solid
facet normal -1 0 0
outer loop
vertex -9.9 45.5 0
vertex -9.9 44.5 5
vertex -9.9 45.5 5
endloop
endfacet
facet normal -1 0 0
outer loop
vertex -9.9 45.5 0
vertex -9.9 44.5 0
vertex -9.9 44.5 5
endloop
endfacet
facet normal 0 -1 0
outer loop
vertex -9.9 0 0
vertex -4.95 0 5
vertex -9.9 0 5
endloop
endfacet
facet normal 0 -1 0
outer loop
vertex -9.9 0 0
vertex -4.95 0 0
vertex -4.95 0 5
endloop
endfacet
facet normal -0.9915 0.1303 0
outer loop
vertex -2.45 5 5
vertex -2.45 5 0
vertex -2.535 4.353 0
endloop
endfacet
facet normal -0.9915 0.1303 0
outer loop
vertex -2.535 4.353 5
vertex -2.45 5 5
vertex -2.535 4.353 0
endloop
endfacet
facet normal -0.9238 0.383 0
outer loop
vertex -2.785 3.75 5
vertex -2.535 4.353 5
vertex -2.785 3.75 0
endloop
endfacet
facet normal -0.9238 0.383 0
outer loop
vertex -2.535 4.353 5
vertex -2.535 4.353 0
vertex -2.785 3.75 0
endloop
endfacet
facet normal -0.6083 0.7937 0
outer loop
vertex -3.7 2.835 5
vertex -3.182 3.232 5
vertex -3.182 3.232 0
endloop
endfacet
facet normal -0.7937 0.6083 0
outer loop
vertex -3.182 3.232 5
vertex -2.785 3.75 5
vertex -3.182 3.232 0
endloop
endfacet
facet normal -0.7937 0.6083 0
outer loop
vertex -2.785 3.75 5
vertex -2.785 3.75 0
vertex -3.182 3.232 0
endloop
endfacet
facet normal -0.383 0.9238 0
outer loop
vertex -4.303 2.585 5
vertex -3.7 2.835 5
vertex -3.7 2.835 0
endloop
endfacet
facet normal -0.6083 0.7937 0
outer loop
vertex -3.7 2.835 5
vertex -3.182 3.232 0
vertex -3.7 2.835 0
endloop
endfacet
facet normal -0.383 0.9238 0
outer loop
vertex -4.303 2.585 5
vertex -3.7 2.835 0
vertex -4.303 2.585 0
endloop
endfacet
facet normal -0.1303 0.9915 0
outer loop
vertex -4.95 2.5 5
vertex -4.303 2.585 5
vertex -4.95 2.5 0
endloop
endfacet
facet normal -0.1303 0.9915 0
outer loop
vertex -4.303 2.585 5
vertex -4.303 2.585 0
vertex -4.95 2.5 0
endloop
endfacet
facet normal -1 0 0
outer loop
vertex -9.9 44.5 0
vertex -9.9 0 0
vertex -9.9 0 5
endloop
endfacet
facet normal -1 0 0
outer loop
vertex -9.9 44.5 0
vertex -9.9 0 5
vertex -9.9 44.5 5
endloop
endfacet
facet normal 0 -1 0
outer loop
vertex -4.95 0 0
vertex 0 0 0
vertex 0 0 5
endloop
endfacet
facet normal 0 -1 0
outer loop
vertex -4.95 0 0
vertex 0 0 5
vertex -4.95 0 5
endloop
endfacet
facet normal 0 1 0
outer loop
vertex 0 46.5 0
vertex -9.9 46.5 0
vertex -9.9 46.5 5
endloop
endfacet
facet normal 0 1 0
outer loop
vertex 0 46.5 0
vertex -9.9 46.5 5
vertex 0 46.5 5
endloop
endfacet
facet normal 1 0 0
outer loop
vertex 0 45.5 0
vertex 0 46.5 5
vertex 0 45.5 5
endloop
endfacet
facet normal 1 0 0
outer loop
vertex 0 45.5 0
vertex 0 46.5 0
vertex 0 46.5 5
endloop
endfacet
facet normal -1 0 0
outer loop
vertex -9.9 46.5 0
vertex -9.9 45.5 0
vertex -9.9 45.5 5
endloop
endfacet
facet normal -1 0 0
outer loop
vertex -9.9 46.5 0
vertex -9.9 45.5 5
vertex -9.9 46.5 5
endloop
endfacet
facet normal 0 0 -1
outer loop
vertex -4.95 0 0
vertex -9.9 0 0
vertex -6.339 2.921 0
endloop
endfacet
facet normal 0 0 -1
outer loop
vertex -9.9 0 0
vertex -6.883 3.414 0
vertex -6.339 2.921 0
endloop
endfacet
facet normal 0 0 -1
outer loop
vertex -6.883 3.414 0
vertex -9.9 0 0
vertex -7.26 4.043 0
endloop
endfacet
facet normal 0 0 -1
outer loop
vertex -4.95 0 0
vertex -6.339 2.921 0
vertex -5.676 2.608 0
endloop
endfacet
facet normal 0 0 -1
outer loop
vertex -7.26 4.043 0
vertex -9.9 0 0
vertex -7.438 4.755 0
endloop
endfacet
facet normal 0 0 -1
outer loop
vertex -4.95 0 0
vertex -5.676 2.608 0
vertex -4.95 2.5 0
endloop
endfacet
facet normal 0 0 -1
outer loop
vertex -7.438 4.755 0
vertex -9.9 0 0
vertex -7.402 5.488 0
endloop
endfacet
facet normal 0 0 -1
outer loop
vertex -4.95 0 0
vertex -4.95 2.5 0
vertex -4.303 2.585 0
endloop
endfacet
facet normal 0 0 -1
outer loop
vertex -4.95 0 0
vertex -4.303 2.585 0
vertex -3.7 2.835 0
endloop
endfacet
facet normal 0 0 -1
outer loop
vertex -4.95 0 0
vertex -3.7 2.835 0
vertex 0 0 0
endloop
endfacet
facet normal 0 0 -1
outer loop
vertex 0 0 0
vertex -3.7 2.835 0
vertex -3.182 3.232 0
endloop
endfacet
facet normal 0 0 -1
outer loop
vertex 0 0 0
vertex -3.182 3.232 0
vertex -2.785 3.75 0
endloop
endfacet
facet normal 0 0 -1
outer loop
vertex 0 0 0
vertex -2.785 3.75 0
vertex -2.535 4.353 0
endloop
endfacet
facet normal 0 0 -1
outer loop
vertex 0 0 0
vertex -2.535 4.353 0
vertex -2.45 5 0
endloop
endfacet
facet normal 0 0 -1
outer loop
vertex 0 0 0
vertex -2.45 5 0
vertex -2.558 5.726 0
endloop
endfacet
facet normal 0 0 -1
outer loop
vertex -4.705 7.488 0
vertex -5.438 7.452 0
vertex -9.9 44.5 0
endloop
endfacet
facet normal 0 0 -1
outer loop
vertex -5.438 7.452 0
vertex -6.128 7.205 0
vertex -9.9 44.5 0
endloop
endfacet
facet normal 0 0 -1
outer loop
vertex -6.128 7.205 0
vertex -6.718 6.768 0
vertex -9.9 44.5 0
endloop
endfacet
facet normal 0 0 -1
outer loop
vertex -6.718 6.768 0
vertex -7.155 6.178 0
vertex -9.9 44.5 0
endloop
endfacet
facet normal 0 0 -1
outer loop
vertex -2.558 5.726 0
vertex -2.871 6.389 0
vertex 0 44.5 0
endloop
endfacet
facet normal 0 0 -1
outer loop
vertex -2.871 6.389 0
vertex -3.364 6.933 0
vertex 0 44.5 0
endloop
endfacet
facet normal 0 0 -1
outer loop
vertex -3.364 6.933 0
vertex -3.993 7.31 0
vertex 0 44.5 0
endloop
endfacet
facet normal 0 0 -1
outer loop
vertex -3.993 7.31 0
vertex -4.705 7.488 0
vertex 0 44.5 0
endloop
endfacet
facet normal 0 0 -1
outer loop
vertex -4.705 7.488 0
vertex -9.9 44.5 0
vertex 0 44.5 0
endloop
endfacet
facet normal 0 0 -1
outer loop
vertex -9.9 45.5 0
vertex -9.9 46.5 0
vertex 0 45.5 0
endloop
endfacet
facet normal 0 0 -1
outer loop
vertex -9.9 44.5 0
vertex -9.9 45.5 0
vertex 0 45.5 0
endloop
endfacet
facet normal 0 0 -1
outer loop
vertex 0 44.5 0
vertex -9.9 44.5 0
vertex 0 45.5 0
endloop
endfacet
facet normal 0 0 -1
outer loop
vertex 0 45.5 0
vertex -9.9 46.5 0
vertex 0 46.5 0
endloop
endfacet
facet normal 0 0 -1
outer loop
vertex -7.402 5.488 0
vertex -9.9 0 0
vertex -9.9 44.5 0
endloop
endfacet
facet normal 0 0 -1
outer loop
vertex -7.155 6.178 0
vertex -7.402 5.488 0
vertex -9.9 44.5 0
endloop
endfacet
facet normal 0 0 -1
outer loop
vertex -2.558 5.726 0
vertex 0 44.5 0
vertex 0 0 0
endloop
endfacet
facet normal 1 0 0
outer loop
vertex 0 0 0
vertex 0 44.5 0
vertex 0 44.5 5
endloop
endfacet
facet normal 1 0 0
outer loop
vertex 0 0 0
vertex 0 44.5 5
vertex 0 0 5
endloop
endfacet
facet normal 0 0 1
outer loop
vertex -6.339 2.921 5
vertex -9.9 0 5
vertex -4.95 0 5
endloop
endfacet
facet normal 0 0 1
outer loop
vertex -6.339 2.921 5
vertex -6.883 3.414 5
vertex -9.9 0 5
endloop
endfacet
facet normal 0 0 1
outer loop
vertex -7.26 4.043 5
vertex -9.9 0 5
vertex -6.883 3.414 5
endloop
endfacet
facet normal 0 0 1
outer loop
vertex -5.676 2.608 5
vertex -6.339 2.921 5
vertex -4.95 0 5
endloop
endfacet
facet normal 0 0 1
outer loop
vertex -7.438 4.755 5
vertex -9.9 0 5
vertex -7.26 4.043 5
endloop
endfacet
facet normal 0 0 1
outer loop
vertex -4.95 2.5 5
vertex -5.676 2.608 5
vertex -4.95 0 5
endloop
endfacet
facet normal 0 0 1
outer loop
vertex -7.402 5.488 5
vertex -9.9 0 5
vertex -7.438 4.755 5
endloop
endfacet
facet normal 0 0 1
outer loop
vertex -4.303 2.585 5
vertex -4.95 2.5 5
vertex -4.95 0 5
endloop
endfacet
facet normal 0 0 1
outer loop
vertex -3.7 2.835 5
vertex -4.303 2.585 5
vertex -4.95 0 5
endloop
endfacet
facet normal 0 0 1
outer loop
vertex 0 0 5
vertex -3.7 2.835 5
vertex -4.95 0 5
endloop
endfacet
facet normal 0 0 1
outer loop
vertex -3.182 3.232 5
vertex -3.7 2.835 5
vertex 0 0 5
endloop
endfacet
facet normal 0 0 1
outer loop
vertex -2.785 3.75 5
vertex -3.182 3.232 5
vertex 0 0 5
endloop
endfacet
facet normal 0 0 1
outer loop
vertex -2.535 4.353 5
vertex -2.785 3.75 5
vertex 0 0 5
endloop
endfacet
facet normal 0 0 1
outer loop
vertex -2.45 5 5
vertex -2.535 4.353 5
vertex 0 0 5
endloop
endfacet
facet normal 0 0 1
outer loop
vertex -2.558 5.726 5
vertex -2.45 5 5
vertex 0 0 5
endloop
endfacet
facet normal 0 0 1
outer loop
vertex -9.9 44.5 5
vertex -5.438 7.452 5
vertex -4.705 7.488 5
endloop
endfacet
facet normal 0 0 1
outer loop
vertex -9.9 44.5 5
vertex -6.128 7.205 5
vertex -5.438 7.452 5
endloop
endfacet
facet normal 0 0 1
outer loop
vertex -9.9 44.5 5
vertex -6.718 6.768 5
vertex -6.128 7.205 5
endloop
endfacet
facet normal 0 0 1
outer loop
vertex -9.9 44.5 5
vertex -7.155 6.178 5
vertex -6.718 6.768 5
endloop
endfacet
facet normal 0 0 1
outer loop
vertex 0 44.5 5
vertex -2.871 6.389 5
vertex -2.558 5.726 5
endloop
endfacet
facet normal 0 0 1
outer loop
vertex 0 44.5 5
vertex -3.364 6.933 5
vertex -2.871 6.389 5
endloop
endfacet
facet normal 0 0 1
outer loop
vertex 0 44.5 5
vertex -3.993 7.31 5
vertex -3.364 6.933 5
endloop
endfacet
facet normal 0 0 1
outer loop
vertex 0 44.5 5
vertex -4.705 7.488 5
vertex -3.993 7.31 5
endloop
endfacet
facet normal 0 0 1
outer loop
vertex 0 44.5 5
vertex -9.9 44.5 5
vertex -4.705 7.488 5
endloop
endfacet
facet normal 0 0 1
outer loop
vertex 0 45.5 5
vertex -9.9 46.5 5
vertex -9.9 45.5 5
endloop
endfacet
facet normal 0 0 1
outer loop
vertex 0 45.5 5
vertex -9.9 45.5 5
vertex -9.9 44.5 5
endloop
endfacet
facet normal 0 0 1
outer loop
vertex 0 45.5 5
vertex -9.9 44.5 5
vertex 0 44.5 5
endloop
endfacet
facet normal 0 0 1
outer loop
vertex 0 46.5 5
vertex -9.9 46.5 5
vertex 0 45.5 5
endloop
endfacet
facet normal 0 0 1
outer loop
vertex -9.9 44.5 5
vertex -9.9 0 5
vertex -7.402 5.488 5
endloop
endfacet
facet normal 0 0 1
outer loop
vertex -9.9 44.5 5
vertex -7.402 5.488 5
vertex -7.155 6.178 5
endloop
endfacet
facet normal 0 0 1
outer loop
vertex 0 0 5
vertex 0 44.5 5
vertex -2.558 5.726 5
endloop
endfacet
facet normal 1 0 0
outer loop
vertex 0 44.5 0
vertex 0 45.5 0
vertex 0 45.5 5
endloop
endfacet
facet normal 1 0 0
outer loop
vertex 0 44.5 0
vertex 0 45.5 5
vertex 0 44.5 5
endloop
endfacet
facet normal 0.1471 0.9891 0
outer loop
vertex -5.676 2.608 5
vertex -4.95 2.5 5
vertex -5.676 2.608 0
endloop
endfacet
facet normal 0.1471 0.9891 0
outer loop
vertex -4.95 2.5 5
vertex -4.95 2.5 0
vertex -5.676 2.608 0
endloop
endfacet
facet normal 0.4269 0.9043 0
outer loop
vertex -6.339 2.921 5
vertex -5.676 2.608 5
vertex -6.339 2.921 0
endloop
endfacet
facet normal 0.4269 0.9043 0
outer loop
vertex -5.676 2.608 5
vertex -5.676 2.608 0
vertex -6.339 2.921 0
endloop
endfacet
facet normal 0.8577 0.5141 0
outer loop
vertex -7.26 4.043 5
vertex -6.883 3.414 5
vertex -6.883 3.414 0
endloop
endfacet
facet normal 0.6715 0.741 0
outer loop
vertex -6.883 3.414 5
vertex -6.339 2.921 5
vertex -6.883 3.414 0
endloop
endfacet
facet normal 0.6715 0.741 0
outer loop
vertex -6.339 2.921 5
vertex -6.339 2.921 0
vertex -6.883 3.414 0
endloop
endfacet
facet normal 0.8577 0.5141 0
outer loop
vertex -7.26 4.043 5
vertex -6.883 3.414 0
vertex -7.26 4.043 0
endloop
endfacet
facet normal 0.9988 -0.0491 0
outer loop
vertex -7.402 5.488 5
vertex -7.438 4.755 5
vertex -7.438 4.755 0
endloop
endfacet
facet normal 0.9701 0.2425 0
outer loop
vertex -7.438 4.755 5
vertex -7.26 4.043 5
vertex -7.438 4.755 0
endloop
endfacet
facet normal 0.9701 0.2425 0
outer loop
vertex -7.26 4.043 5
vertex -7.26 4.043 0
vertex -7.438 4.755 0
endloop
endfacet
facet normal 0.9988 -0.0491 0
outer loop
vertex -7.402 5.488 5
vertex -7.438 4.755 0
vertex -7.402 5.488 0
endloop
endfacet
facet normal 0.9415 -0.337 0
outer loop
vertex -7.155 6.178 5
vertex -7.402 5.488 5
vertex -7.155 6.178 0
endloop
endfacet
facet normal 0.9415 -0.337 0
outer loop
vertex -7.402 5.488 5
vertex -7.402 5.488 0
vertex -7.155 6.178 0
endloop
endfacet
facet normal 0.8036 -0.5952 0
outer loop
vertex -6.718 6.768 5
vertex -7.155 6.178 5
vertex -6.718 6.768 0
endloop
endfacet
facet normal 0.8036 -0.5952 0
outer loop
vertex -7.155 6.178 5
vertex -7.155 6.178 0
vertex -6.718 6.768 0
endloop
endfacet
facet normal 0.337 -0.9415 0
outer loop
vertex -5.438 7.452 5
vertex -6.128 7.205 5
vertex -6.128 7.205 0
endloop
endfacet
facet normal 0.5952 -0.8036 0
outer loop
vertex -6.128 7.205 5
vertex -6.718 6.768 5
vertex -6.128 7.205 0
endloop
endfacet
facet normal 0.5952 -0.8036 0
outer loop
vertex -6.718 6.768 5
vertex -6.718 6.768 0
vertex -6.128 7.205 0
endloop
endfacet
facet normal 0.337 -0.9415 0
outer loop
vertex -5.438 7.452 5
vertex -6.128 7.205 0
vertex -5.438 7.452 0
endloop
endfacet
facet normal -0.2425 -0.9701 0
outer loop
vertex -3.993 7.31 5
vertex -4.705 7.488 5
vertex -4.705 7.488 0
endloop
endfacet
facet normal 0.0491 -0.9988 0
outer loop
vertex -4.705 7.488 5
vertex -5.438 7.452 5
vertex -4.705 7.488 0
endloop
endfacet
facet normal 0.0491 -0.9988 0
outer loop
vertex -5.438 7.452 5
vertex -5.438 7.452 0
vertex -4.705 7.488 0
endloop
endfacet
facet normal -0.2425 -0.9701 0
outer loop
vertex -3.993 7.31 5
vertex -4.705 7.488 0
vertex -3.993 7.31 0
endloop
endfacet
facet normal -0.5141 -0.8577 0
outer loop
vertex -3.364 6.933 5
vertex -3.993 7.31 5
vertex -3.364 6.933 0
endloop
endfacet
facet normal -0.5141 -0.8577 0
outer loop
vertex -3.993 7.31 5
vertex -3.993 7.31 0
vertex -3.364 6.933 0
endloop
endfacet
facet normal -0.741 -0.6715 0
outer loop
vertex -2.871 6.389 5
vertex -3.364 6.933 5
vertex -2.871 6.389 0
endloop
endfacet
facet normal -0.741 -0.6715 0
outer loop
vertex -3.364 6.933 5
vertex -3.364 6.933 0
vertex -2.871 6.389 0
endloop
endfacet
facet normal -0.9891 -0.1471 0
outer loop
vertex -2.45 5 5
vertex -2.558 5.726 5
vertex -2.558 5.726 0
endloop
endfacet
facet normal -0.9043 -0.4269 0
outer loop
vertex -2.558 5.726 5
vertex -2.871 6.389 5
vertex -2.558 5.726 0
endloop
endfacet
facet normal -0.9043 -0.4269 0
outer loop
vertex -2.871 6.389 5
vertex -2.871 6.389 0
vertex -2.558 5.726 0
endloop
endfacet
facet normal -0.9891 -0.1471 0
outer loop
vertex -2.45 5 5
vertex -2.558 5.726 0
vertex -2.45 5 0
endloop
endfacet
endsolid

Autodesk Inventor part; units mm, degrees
ref_plane "YZ Plane" through (0, 0, 0) normal (1, 0, 0) x (0, 1, 0)
ref_plane "XZ Plane" through (0, 0, 0) normal (0, 1, 0) x (-1, 0, 0)
ref_plane "XY Plane" through (0, 0, 0) normal (0, 0, 1) x (1, 0, 0)
sketch "Sketch2" plane through (0, 0, 0) normal (0, 0, 1) x (1, 0, 0)
  line L0 (0, 0) -> (-9.9, 0)
  line L1 (-4.95, 0) -> (-4.95, 2.5)
  line L2 (-4.95, 0) -> (-2.45, 0) construction
  circle A0 centre (-4.95, 5) radius 2.5
  line L3 (-4.95, 7.5) -> (32.05, 7.5) construction
  line L4 (0, 44.5) -> (0, 0)
  line L5 (0, 0) -> (-9.9, 0)
  line L6 (-9.9, 0) -> (-9.9, 44.5)
  line L7 (0, 45.5) -> (0, 0)
  line L8 (0, 0) -> (-9.9, 0)
  line L9 (-9.9, 0) -> (-9.9, 45.5)
  line L10 (-4.95, 7.5) -> (66.05, 7.5) construction
  line L11 (0, 0) -> (-9.9, 0)
  line L12 (-9.9, 0) -> (-9.9, 46.5)
  line L13 (-9.9, 46.5) -> (0, 46.5)
  line L14 (0, 46.5) -> (0, 0)
  dimension "d35" = 5
  dimension "d33" = 2.5
  dimension "d34" = 90
  dimension "d46" = 46.5
extrude "Extrusion6" add sketch "Sketch2" along normal blind 5
properties part number "Elbow_Cube_Holder_TestFit_V2"
